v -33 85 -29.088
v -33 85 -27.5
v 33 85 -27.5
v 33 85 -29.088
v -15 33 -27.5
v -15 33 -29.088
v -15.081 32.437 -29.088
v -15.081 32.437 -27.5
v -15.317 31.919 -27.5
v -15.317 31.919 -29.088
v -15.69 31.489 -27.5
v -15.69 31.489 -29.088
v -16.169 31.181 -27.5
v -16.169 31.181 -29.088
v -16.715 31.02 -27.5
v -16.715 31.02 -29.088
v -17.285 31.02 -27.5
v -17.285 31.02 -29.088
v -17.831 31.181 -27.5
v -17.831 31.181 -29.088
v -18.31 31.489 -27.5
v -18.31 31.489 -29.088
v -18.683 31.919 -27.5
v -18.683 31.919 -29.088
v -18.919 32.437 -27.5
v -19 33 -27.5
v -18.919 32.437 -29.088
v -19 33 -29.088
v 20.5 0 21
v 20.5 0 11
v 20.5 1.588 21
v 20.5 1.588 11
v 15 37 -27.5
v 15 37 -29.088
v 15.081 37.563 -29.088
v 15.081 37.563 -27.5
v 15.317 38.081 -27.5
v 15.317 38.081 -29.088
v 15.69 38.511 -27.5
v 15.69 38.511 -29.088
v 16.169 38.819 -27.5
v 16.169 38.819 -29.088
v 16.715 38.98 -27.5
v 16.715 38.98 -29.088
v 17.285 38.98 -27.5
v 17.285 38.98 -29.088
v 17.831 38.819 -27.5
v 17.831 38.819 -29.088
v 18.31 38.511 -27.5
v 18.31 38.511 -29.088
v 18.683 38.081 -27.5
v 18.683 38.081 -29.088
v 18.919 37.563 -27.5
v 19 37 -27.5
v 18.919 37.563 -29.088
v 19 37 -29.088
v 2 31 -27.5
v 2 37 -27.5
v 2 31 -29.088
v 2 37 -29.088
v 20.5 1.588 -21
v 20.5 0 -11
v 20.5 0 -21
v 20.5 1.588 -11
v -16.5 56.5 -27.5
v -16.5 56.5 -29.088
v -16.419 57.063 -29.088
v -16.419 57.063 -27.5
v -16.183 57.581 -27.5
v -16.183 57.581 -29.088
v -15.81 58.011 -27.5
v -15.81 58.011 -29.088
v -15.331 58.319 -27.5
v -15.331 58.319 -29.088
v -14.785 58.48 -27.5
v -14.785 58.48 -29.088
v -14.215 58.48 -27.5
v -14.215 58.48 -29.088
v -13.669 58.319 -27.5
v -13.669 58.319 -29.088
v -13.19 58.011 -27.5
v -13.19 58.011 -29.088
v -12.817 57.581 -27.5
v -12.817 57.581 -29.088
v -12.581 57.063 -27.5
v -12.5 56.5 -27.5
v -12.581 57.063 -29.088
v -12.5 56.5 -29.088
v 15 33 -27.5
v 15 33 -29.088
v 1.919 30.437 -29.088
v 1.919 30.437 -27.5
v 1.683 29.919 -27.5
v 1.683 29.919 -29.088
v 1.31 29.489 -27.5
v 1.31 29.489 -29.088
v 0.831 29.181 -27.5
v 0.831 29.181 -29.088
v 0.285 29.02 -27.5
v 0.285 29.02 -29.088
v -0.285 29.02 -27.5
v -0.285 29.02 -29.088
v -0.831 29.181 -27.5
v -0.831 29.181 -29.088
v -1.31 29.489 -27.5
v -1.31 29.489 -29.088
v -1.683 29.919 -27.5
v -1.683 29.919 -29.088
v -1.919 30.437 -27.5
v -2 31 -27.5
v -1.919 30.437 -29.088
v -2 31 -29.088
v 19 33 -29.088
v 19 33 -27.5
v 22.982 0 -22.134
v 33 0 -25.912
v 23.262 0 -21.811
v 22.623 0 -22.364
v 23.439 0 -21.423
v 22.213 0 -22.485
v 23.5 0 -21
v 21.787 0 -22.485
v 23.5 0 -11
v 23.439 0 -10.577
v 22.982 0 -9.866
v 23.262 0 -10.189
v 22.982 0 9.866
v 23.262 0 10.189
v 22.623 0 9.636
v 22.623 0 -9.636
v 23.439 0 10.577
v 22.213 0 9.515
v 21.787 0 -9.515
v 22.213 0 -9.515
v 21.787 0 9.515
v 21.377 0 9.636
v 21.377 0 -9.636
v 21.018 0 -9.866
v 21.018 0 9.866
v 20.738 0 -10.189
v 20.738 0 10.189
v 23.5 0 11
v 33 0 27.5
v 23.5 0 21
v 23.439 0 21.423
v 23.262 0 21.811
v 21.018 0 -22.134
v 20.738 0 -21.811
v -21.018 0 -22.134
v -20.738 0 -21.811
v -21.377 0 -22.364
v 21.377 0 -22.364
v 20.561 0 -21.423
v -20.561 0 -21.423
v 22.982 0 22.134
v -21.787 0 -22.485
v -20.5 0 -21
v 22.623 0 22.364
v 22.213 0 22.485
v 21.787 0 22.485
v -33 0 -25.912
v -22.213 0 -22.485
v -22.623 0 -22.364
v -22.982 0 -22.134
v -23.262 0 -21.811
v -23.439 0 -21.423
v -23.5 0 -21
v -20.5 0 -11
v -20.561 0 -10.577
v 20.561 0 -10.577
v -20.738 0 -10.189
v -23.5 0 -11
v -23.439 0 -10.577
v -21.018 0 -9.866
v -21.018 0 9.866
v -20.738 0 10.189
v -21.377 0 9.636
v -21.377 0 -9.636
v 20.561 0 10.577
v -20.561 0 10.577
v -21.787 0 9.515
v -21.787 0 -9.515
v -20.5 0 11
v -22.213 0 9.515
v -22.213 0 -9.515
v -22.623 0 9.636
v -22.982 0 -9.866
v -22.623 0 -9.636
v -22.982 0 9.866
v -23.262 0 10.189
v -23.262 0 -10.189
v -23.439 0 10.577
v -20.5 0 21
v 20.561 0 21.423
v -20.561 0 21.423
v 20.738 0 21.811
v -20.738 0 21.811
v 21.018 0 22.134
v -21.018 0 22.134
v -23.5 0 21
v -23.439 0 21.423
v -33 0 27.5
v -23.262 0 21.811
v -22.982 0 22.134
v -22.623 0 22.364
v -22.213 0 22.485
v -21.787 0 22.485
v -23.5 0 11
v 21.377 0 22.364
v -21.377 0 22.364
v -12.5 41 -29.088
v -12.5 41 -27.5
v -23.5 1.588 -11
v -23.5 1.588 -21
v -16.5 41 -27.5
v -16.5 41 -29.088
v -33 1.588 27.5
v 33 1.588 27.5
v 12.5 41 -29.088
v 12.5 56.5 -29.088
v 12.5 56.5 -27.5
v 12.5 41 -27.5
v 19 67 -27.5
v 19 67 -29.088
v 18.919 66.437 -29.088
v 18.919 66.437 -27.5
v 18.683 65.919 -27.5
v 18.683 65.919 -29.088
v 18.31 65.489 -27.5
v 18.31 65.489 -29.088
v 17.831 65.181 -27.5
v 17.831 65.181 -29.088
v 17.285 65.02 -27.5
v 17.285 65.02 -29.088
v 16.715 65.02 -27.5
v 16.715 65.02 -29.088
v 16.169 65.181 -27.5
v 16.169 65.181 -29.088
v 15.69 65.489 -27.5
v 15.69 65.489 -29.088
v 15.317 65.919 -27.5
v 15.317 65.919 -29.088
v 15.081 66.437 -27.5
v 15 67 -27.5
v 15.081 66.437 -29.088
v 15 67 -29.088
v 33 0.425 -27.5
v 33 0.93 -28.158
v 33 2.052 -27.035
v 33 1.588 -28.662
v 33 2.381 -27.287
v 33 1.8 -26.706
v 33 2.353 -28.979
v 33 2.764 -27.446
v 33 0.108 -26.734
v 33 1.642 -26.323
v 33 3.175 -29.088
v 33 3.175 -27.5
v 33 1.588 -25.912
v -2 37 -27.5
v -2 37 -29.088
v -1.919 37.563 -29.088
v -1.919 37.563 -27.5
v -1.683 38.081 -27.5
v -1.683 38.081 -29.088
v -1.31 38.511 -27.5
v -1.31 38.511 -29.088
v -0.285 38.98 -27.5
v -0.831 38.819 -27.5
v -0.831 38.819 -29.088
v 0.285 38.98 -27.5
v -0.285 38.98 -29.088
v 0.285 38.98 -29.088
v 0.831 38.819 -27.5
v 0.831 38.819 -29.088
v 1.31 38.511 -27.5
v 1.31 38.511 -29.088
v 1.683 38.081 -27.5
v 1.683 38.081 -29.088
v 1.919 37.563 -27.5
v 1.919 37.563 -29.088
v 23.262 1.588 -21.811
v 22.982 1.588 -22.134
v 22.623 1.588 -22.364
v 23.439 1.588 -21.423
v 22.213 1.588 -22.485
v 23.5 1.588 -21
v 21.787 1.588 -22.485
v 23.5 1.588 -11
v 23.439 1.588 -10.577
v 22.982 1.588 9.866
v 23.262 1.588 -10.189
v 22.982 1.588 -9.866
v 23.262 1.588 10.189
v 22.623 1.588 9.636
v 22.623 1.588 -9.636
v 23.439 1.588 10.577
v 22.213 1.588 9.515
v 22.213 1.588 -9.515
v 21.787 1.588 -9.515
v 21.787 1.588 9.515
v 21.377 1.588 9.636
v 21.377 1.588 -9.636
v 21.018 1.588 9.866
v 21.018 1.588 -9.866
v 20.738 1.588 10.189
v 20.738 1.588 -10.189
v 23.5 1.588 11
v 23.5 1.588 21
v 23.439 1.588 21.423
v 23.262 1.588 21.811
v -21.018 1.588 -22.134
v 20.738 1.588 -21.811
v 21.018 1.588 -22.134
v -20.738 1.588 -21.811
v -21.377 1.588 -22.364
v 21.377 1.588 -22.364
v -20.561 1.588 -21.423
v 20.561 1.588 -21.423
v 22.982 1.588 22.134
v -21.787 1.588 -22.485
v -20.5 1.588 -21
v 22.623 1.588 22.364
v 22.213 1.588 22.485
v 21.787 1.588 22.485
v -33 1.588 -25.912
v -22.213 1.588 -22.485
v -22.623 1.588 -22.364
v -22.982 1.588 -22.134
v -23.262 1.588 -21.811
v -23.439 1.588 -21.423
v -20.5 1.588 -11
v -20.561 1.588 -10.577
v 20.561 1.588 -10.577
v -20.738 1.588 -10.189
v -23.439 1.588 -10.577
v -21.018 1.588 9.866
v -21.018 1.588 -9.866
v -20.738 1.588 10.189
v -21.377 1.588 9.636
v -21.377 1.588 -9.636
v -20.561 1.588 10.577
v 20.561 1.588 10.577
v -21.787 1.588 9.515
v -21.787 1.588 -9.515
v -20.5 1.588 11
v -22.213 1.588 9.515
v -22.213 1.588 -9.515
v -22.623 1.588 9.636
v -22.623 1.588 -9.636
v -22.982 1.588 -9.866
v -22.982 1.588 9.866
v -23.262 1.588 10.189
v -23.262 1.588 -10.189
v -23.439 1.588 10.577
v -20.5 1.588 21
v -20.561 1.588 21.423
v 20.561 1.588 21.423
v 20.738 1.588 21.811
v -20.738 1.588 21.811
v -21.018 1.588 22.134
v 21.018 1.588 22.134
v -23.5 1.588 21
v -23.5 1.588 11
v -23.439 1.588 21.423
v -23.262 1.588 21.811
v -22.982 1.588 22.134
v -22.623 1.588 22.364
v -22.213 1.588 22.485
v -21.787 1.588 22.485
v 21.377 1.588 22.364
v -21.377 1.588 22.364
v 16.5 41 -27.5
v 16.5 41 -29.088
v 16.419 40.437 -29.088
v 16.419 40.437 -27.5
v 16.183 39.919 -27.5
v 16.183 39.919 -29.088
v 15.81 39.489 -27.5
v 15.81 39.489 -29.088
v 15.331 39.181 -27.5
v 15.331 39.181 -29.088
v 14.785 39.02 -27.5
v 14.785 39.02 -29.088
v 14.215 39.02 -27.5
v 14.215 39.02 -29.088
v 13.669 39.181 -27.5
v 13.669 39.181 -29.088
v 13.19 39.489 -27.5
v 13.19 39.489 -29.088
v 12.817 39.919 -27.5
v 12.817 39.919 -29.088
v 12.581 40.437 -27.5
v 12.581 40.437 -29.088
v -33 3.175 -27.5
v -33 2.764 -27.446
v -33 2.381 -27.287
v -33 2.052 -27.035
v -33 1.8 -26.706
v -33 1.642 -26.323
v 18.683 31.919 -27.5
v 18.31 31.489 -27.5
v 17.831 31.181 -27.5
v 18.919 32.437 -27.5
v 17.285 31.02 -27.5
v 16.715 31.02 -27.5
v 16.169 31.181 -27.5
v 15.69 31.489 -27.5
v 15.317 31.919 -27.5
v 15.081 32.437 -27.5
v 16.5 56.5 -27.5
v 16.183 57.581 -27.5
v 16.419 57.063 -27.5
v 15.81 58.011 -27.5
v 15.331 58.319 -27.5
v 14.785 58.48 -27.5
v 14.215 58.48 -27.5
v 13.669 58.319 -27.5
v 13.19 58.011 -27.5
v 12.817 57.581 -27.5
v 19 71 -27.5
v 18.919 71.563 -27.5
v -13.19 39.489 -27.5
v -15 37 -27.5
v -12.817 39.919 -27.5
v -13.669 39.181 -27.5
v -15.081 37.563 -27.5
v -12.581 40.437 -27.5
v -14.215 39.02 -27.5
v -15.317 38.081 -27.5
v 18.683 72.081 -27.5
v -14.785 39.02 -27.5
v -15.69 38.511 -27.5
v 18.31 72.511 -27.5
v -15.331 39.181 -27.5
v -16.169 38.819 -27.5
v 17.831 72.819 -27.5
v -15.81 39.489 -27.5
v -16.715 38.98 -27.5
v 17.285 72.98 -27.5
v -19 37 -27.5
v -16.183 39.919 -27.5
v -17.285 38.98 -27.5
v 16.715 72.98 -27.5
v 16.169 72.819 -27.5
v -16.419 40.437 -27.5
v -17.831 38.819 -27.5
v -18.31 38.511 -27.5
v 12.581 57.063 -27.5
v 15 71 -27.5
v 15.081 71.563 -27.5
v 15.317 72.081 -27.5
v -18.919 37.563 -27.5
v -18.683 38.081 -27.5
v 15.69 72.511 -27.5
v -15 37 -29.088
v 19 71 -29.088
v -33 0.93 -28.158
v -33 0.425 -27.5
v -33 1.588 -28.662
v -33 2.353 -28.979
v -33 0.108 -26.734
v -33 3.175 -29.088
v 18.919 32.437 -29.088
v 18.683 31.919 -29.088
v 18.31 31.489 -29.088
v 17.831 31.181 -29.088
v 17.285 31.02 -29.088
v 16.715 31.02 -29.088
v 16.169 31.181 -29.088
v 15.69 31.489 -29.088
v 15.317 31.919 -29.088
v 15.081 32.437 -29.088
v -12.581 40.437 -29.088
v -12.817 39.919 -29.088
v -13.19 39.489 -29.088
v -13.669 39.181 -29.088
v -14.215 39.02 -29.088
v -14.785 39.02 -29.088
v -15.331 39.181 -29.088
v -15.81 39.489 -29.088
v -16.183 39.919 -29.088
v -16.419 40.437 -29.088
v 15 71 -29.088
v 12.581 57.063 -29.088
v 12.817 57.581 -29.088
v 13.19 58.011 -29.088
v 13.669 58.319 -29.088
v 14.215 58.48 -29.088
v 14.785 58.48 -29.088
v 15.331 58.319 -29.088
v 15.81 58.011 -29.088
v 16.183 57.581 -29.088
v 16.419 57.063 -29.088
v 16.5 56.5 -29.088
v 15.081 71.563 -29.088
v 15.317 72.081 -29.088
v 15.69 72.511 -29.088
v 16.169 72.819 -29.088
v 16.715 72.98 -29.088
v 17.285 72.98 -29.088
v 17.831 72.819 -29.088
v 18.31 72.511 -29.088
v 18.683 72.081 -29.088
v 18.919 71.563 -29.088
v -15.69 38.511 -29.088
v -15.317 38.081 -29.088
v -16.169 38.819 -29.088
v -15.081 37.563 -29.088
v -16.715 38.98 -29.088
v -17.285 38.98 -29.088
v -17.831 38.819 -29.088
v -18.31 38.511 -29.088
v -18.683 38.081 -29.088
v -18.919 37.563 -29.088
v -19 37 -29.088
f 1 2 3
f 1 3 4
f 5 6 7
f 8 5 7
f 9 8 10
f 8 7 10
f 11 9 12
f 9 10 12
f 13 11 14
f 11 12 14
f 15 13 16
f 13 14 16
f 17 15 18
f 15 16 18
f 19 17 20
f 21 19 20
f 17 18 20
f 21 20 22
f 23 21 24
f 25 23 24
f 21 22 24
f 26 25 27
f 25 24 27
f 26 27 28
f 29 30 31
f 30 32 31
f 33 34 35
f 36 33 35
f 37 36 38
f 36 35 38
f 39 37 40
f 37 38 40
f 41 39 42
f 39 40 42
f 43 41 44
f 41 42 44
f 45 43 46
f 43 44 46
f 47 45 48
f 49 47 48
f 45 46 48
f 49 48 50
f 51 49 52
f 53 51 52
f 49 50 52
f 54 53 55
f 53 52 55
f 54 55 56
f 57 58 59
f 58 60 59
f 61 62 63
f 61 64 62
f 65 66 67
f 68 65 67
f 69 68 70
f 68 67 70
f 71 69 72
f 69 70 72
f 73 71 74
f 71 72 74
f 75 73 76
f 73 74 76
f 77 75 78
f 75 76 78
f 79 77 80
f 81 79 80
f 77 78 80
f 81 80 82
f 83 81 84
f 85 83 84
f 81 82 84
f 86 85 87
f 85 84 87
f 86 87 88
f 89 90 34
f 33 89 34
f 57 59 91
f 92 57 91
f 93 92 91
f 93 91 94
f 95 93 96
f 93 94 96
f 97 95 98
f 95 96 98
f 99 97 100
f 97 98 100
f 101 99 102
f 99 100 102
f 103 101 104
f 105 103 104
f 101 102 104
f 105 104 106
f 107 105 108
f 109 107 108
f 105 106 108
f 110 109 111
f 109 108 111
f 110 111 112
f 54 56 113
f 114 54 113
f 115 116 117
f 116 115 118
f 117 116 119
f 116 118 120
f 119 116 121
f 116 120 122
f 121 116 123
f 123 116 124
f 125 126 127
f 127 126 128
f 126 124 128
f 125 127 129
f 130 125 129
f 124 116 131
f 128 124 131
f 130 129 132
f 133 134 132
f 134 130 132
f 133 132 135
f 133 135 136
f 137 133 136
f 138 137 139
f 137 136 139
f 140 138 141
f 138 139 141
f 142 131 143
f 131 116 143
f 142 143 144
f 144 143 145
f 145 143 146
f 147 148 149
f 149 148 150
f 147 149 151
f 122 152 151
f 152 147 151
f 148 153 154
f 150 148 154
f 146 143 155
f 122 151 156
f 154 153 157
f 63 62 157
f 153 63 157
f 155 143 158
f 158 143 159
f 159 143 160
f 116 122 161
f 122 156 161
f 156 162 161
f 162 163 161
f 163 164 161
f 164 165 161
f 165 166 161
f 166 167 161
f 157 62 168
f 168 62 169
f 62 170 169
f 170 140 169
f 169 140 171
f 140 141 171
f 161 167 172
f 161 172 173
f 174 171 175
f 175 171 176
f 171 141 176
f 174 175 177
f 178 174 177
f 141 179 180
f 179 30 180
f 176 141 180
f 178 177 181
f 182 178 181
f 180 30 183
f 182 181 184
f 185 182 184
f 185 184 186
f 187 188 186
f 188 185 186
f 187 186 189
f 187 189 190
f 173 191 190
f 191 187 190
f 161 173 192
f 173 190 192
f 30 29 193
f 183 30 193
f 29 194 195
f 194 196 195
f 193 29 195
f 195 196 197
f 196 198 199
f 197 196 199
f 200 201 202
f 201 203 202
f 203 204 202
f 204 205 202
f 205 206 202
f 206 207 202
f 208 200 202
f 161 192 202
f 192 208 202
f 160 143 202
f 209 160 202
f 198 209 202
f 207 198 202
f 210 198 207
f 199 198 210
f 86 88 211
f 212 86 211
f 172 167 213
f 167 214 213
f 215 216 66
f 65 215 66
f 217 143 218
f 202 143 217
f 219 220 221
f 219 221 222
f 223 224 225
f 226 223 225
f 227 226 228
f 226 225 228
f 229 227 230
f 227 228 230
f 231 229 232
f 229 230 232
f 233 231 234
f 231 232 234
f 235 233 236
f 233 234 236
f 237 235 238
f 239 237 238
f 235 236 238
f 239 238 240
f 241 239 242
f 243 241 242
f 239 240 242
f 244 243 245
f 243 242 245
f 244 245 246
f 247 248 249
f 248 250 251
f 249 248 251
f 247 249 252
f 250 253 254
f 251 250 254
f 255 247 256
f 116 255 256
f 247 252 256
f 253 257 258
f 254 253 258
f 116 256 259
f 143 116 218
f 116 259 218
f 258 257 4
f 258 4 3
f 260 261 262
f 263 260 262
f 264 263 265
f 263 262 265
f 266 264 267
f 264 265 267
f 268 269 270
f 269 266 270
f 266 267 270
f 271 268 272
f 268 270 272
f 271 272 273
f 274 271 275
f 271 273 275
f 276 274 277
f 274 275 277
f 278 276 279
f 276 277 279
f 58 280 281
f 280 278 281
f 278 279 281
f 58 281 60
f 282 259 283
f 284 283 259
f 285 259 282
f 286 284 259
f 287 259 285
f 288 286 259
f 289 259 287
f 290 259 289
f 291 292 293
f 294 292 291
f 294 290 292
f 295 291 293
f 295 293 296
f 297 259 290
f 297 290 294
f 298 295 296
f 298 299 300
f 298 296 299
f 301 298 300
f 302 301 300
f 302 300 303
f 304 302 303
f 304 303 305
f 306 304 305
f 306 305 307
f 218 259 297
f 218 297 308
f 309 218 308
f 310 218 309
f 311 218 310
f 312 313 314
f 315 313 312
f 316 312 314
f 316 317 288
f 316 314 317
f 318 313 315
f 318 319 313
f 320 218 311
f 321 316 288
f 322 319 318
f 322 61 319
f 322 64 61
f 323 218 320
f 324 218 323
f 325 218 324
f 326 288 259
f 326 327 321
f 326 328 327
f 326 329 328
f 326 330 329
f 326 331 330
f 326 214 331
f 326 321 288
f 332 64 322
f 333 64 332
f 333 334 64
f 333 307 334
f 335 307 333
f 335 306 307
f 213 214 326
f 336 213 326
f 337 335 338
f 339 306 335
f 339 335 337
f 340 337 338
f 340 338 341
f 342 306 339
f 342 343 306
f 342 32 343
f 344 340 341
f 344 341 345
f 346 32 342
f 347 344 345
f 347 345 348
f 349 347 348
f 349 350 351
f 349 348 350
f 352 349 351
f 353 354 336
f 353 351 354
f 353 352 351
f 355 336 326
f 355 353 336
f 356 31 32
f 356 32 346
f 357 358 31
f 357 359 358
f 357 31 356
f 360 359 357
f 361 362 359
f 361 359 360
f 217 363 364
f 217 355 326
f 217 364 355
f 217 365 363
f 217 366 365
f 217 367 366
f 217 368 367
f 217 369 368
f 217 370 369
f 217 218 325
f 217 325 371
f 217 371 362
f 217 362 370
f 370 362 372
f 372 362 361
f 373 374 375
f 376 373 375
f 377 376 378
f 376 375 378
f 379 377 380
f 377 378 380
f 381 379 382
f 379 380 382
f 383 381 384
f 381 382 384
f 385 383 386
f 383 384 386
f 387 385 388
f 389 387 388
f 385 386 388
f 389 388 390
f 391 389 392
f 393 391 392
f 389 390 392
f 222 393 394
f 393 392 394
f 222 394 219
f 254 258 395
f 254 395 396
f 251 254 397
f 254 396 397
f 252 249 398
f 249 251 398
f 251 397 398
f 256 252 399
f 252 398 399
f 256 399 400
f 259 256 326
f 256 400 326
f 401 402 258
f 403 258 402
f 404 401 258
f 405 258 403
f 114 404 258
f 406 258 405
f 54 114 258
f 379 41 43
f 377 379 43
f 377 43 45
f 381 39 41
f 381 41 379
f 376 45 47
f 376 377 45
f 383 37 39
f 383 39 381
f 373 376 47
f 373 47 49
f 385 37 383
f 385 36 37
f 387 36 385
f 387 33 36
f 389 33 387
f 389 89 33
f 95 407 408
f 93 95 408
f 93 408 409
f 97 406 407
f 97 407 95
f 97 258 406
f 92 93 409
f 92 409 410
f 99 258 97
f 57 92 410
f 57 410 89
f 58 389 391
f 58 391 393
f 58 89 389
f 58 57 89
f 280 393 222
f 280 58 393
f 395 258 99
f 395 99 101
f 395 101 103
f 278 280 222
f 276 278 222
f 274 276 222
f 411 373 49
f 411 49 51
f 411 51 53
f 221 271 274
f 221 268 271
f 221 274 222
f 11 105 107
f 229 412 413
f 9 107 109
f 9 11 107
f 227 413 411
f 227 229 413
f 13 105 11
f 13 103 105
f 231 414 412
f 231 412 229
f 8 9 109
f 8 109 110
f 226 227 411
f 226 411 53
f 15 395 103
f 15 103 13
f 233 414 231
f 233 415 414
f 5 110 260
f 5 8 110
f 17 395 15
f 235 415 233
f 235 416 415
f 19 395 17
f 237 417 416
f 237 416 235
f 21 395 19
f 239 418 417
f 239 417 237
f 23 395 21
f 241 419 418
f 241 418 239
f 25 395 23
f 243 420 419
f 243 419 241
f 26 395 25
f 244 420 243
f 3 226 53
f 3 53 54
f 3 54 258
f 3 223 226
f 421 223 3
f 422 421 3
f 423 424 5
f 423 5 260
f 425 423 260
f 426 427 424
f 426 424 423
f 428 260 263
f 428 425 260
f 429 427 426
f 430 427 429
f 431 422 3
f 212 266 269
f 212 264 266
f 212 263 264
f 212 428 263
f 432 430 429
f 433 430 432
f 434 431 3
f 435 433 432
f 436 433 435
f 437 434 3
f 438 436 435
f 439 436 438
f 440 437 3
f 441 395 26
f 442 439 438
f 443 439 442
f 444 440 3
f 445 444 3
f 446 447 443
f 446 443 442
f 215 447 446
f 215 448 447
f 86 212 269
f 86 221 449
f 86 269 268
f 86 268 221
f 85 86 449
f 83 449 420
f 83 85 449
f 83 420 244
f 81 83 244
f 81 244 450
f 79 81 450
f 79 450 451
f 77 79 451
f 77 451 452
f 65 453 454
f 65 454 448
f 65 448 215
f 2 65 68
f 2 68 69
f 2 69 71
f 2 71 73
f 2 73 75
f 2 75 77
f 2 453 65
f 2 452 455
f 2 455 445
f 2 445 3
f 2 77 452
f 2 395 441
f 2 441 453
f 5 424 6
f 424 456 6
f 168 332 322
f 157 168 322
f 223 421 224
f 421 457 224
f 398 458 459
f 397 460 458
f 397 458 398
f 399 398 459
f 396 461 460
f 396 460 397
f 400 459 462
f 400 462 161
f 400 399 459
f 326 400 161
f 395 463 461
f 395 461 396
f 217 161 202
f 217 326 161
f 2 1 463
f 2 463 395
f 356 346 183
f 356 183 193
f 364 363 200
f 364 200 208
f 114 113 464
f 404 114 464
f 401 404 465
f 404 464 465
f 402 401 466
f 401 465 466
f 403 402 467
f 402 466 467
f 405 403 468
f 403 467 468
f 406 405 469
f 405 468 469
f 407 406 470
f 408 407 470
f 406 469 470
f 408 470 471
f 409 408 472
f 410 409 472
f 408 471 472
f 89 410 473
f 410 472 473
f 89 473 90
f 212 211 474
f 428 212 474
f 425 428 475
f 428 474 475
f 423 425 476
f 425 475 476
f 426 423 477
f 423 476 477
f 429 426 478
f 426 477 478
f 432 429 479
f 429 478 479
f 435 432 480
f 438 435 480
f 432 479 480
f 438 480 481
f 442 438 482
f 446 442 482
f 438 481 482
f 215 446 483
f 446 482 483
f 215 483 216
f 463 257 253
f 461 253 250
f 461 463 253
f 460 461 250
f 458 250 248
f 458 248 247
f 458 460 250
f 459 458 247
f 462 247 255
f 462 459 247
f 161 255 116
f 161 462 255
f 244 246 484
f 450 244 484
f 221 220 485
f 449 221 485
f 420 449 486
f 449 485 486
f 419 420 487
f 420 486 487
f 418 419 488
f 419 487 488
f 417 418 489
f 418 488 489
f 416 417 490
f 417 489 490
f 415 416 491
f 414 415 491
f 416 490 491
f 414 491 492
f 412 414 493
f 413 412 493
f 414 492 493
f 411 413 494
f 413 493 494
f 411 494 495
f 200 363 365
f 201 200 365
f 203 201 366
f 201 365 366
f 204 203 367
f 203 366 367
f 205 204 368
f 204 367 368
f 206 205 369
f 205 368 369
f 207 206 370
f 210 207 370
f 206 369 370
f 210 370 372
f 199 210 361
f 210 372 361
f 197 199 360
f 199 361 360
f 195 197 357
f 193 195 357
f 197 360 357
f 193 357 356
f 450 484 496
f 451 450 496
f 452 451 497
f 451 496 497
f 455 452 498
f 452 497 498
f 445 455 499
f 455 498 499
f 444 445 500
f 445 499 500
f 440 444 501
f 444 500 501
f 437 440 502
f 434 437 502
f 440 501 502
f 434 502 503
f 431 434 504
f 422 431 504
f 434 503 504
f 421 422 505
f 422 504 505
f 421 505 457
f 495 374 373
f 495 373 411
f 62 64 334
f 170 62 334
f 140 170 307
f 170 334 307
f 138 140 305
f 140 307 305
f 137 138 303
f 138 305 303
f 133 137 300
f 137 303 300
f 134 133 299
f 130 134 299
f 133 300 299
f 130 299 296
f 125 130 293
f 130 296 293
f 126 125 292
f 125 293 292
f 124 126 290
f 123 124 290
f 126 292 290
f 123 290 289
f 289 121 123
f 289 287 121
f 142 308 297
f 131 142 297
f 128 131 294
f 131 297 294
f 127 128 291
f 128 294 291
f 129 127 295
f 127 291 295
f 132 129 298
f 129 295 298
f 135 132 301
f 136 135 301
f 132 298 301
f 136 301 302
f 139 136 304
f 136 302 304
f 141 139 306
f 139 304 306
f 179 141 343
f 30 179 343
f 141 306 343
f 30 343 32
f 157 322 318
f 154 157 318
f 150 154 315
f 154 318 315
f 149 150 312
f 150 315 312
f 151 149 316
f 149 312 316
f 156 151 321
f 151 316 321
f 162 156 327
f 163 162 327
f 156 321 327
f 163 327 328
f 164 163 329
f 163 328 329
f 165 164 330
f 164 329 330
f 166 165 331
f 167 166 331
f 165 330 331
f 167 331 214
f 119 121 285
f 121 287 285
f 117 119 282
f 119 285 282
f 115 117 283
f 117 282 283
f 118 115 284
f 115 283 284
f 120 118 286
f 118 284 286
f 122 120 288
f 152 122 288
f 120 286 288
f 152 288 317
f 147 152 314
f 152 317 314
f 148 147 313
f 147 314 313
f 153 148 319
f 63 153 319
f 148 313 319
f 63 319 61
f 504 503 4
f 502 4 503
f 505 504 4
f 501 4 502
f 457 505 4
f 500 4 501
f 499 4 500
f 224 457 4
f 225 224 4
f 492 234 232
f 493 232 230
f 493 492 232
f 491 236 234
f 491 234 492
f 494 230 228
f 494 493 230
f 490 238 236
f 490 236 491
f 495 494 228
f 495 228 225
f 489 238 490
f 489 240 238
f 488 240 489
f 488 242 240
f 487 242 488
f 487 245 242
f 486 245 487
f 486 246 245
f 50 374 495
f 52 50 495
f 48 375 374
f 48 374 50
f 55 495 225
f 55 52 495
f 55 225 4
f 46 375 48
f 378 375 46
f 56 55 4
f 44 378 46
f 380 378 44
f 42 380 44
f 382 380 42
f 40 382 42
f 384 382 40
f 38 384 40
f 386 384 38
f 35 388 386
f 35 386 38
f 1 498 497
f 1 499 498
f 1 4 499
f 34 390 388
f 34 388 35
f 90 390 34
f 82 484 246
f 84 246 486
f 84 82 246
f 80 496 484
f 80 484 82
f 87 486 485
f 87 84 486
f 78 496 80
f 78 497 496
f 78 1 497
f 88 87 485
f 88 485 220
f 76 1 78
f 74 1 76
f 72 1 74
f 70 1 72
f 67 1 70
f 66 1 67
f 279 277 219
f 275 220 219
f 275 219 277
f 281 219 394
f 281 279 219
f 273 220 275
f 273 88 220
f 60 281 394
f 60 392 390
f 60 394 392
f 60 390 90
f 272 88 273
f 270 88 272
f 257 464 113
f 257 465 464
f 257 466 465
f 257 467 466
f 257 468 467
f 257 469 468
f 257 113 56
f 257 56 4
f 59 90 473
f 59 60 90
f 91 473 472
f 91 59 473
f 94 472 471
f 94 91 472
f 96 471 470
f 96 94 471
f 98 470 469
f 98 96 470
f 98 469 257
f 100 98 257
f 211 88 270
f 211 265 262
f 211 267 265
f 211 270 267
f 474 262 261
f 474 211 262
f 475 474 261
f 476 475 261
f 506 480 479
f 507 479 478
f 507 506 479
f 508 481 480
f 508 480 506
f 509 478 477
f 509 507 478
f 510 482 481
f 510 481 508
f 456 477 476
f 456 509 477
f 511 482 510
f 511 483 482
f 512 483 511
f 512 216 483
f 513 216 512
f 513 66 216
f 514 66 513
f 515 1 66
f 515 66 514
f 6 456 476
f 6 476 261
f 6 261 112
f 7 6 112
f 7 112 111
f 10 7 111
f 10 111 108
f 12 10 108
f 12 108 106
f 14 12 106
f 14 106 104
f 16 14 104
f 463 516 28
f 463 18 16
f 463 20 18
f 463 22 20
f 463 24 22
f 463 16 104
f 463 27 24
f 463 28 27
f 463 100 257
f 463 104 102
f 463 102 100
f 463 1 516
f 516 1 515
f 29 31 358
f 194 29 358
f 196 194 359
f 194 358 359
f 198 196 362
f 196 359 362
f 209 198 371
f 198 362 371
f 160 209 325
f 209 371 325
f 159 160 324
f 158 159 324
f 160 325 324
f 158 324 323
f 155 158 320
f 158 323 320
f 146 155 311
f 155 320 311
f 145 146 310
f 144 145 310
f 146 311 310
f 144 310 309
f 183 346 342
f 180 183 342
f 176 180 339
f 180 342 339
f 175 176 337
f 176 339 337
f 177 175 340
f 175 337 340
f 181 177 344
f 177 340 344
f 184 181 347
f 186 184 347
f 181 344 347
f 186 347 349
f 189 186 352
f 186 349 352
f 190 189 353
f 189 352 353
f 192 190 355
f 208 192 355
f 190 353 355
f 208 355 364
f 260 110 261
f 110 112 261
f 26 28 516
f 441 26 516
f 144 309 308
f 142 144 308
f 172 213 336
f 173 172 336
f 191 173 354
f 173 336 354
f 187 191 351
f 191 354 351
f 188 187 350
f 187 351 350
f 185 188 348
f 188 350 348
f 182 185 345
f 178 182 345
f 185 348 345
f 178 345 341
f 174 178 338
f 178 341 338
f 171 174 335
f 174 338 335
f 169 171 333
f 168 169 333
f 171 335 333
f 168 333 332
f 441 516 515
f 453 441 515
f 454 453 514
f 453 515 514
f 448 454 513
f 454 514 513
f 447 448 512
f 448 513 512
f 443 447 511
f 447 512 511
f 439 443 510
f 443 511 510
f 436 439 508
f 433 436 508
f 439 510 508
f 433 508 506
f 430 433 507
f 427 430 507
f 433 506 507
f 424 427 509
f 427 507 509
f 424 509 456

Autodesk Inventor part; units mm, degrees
ref_plane "YZ Plane" through (0, 0, 0) normal (1, 0, 0) x (0, 1, 0)
ref_plane "XZ Plane" through (0, 0, 0) normal (0, 1, 0) x (-1, 0, 0)
ref_plane "XY Plane" through (0, 0, 0) normal (0, 0, 1) x (1, 0, 0)
sketch "Sketch1" plane through (0, 0, 0) normal (0, 1, 0) x (-1, 0, 0)
  line L0 (33, -27.5) -> (-33, -27.5)
  line L1 (-33, -27.5) -> (-33, 27.5)
  line L2 (-33, 27.5) -> (33, 27.5)
  line L3 (33, 27.5) -> (33, -27.5)
  line L4 (33, -27.5) -> (-33, 27.5) construction
  line L5 (-33, -27.5) -> (33, 27.5) construction
  point P0 (0, 0)
  dimension "d0" = 66
  dimension "d1" = 55
extrude "Plate1" add sketch "Sketch1" along normal blind 1.5875
sketch "Sketch3" plane through (0, 1.5875, 0) normal (0, 1, 0) x (1, 0, 0)
  line L0 (0, 0) -> (-33, 0)
  line L1 (-33, 0) -> (-33, 27.5)
  line L2 (-33, 27.5) -> (0, 27.5)
  line L3 (0, 27.5) -> (0, 0)
  circle A0 centre (-22, 16) radius 1.5
  circle A1 centre (-22, -16) radius 1.5
  circle A2 centre (22, 16) radius 1.5
  circle A3 centre (22, -16) radius 1.5
  line L4 (-22, 11) -> (-22, 21) construction
  line L5 (-20.5, 11) -> (-20.5, 21)
  line L6 (-23.5, 21) -> (-23.5, 11)
  arc A4 (-23.5, 11) -> (-20.5, 11) centre (-22, 11) ccw
  arc A5 (-20.5, 21) -> (-23.5, 21) centre (-22, 21) ccw
  line L7 (20.5, 11) -> (20.5, 21)
  line L8 (23.5, 21) -> (23.5, 11)
  arc A6 (20.5, 11) -> (23.5, 11) centre (22, 11) ccw
  arc A7 (23.5, 21) -> (20.5, 21) centre (22, 21) ccw
  line L9 (-20.5, -11) -> (-20.5, -21)
  line L10 (-23.5, -21) -> (-23.5, -11)
  arc A8 (-20.5, -11) -> (-23.5, -11) centre (-22, -11) ccw
  arc A9 (-23.5, -21) -> (-20.5, -21) centre (-22, -21) ccw
  arc A10 (20.5, -21) -> (23.5, -21) centre (22, -21) ccw
  line L11 (23.5, -21) -> (23.5, -11)
  line L12 (20.5, -11) -> (20.5, -21)
  arc A11 (23.5, -11) -> (20.5, -11) centre (22, -11) ccw
  dimension "d22" = 3
  dimension "d23" = 32
  dimension "d24" = 22
  dimension "d48" = 5
  dimension "d49" = 3
extrude "Cut1" cut sketch "Sketch3" against normal blind 1.5875 contours A0 | L5 A4 L6 A0 | A0 L6 A5 L5 | A1 | L9 A9 L10 A1 | A1 L10 A8 L9 | A2 | L8 A6 L7 A2 | A2 L7 A7 L8 | A3 | L11 A10 L12 A3 | A3 L12 A11 L11
sketch "Sketch2" plane through (-33, 1.5875, -27.5) normal (0, 0, -1) x (-1, 0, 0)
  line L0 (-66, 0) -> (0, 0)
  line L1 (0, 0) -> (0, 83.4125)
  line L2 (0, 83.4125) -> (-66, 83.4125)
  line L3 (-66, 83.4125) -> (-66, 0)
edge flange "Flange1" height 85 angle 90 thickness 1.5875 bend radius 1.5875 thickness toward (0, 0, -1) relief tear relief width 1.5875 relief depth 0.7937 edges at (0, 1.5875, -27.5) wall of the first edge with corners at (33, 1.5875, -27.5) (-33, 1.5875, -27.5) (-33, 85, -27.5) (33, 85, -27.5)
bend "Bend1"
corner "Corner1"
sketch "Sketch4" plane through (33, 85, -29.0875) normal (0, 0, -1) x (-1, 0, 0)
  line L0 (0, -81.825) -> (66, -81.825) projected
  line L1 (66, 0) -> (66, -81.825) projected
  line L2 (0, 0) -> (66, 0) projected
  line L3 (33, -54) -> (33, -48) construction
  line L4 (35, -54) -> (35, -48)
  line L5 (31, -48) -> (31, -54)
  arc A0 (31, -54) -> (35, -54) centre (33, -54) ccw
  arc A1 (35, -48) -> (31, -48) centre (33, -48) ccw
  line L6 (33, -81.825) -> (33, 0)
  line L7 (47.5, -44) -> (47.5, -28.5) construction
  line L8 (49.5, -44) -> (49.5, -28.5)
  line L9 (45.5, -28.5) -> (45.5, -44)
  arc A2 (45.5, -44) -> (49.5, -44) centre (47.5, -44) ccw
  arc A3 (49.5, -28.5) -> (45.5, -28.5) centre (47.5, -28.5) ccw
  line L10 (18.5, -44) -> (18.5, -28.5) construction
  line L11 (16.5, -44) -> (16.5, -28.5)
  line L12 (20.5, -28.5) -> (20.5, -44)
  arc A4 (16.5, -44) -> (20.5, -44) centre (18.5, -44) ccw
  arc A5 (20.5, -28.5) -> (16.5, -28.5) centre (18.5, -28.5) ccw
  line L13 (66, -85) -> (0, -85) projected
  line L14 (16, -50) -> (50, -50)
  line L15 (50, -50) -> (50, -16)
  line L16 (50, -16) -> (16, -16)
  line L17 (16, -16) -> (16, -50)
  circle A6 centre (16, -16) radius 2
  circle A7 centre (16, -50) radius 2
  circle A8 centre (50, -50) radius 2
  line L18 (33, -16) -> (33, -50)
  line L19 (16, -18) -> (16, -14) construction
  line L20 (18, -18) -> (18, -14)
  line L21 (14, -14) -> (14, -18)
  arc A9 (14, -18) -> (18, -18) centre (16, -18) ccw
  arc A10 (18, -14) -> (14, -14) centre (16, -14) ccw
  line L22 (16, -52) -> (16, -48) construction
  line L23 (18, -52) -> (18, -48)
  line L24 (14, -48) -> (14, -52)
  arc A11 (14, -52) -> (18, -52) centre (16, -52) ccw
  arc A12 (18, -48) -> (14, -48) centre (16, -48) ccw
  line L25 (50, -52) -> (50, -48) construction
  line L26 (52, -52) -> (52, -48)
  line L27 (48, -48) -> (48, -52)
  arc A13 (48, -52) -> (52, -52) centre (50, -52) ccw
  arc A14 (52, -48) -> (48, -48) centre (50, -48) ccw
  point P0 (33, -85)
  point P1 (33, -51)
  point P2 (47.5, -36.25)
  point P3 (18.5, -36.25)
  dimension "d25" = 3
  dimension "d26" = 4
  dimension "d29" = 4
  dimension "d30" = 15.5
  dimension "d31" = 14.5
  dimension "d46" = 48.75
  dimension "d47" = 34
  dimension "d50" = 34
  dimension "d51" = 34
  dimension "d52" = 4
  dimension "d53" = 4
  dimension "d54" = 4
  dimension "d55" = 35
  dimension "d56" = 0
  dimension "d57" = 2
  dimension "d58" = 4
  dimension "d59" = 2
  dimension "d60" = 4
  dimension "d61" = 2
  dimension "d62" = 4
extrude "Cut2" cut sketch "Sketch4" against normal blind 1.5875 contours L6 L14 L4 A0 | A0 L5 L14 L6 | L14 L5 A1 L6 | L6 A1 L4 L14 | A7 L17 L14 | L14 L17 A7 | L23 A11 L24 A7 | A7 L17 A12 L23 | A8 L15 L14 | L27 A14 L15 A8 | L14 L15 A8 | A8 L26 A13 L27 | A6 L17 L16 | L16 L17 A6 | L20 A9 L17 A6 | A6 L21 A10 L20 | A7 L24 A12 L17 | L15 A14 L26 A8 | A6 L17 A9 L21 | A2 L9 A3 L8 | L11 A5 L12 A4
equation "\"d0\" = subframe_x"
equation "\"d1\" = subframe_y"
equation "\"d22\" = m3_diameter"
equation "\"d23\" = 0.4 * frame_y"
equation "\"d24\" = 0.333333 * subframe_x"
equation "\"d49\" = m3_diameter"
equation "\"d20\" = Thickness"
equation "\"d26\" = m4_diameter"
equation "\"d29\" = m4_diameter"
equation "\"d33\" = Thickness"
equation "\"Thickness\" = sm_thickness"
equation "\"d3\" = BendReliefWidth"
equation "\"d4\" = BendReliefDepth"
equation "\"d5\" = MinimumRemnant"
equation "\"d6\" = BendRadius"
equation "\"d7\" = galvo_frame_z"
equation "\"d9\" = BendRadius"
equation "\"d11\" = CornerReliefSize"
equation "\"d12\" = GapSize"
equation "\"d13\" = JacobiRadiusSize"
equation "\"BendRadius\" = Thickness"
equation "\"BendReliefWidth\" = Thickness"
equation "\"BendReliefDepth\" = 0.5 * Thickness"
equation "\"CornerReliefSize\" = 4 * Thickness"
equation "\"MinimumRemnant\" = 2 * Thickness"
equation "\"TransitionRadius\" = BendRadius"
equation "\"JacobiRadiusSize\" = BendRadius"
equation "\"GapSize\" = Thickness"
equation "\"sm_thickness\" = 1.5875"
equation "\"very_thick_acrylic\" = 9.45"
equation "\"thick_acrylic\" = 5.88"
equation "\"thin_acrylic\" = 3.15"
equation "\"clear_acrylic\" = 3.15"
equation "\"wood_thickness\" = 6.72"
equation "\"m3_diameter\" = 3"
equation "\"m3_head\" = 6"
equation "\"m4_diameter\" = 4"
equation "\"m5_diameter\" = 5"
equation "\"m5_head\" = 10.3"
equation "\"brass_insert_drill\" = 4"
equation "\"m5_brass_insert_drill\" = 6.7"
equation "\"m3_press_nut_drill\" = 4.5"
equation "\"m5_press_nut_drill\" = 6.5"
equation "\"laser_body_diameter\" = 12"
equation "\"carrier_y\" = 251"
equation "\"carrier_z\" = 12"
equation "\"visor_x\" = 253.925"
equation "\"visor_y\" = 85.6"
equation "\"window_z\" = 332.225"
equation "\"window_y\" = 93.75"
equation "\"window_overlap\" = 48"
equation "\"acrylic_into_frame\" = 5"
equation "\"door_x\" = 251"
equation "\"door_z\" = 332.225"
equation "\"door_overlap\" = 48"
equation "\"reservoir_x\" = 201"
equation "\"reservoir_y\" = 201"
equation "\"linear_bearing_spacing\" = 271"
equation "\"tray_border\" = 25"
equation "\"tray_x\" = 251"
equation "\"tray_y\" = 251"
equation "\"bed_z\" = 25"
equation "\"crane_z2\" = 12"
equation "\"switch_spacing\" = 19"
equation "\"frame_top_z\" = 385"
equation "\"frame_bottom_z\" = 275"
equation "\"frame_total_z\" = 661.5875"
equation "\"frame_face_y\" = 45"
equation "\"frame_border\" = 48.0375"
equation "\"frame_foot_z\" = 12"
equation "\"frame_screw_from_center\" = 25"
equation "\"laser_y_offset\" = 19.4"
equation "\"laser_diameter\" = 12"
equation "\"laser_z_offset\" = 55"
equation "\"laser_y\" = 15"
equation "\"laser_z\" = 75"
equation "\"laser_gap\" = 1"
equation "\"subframe_x\" = 66"
equation "\"subframe_y\" = 55"
equation "\"galvo_frame_x\" = 66"
equation "\"galvo_frame_z\" = 85"
equation "\"galvo_frame_y_offset\" = 27.5"
equation "\"drawer_x\" = 257.3"
equation "\"drawer_y\" = 90.3375"
equation "\"drawer_z\" = 278.175"
equation "\"drawer_support_from_top\" = 48"
equation "\"drawer_screw_from_center\" = 55"
equation "\"nema17_x\" = 43"
equation "\"d2\" = BendRadius"
equation "\"d44\" = galvo_frame_x"
equation "\"al_thickness\" = 1.5875"
equation "\"rivet_diameter\" = 3.3"
equation "\"bend_factor\" = 2.26205"
equation "\"sm_bend\" = 3.591"
equation "\"al_bend\" = 3.591"
equation "\"frame_x\" = 353.375"
equation "\"carrier_z2\" = 25"
equation "\"carrier_y2\" = 76.825"
equation "\"frame_y\" = 80"
properties part number "subframe"
